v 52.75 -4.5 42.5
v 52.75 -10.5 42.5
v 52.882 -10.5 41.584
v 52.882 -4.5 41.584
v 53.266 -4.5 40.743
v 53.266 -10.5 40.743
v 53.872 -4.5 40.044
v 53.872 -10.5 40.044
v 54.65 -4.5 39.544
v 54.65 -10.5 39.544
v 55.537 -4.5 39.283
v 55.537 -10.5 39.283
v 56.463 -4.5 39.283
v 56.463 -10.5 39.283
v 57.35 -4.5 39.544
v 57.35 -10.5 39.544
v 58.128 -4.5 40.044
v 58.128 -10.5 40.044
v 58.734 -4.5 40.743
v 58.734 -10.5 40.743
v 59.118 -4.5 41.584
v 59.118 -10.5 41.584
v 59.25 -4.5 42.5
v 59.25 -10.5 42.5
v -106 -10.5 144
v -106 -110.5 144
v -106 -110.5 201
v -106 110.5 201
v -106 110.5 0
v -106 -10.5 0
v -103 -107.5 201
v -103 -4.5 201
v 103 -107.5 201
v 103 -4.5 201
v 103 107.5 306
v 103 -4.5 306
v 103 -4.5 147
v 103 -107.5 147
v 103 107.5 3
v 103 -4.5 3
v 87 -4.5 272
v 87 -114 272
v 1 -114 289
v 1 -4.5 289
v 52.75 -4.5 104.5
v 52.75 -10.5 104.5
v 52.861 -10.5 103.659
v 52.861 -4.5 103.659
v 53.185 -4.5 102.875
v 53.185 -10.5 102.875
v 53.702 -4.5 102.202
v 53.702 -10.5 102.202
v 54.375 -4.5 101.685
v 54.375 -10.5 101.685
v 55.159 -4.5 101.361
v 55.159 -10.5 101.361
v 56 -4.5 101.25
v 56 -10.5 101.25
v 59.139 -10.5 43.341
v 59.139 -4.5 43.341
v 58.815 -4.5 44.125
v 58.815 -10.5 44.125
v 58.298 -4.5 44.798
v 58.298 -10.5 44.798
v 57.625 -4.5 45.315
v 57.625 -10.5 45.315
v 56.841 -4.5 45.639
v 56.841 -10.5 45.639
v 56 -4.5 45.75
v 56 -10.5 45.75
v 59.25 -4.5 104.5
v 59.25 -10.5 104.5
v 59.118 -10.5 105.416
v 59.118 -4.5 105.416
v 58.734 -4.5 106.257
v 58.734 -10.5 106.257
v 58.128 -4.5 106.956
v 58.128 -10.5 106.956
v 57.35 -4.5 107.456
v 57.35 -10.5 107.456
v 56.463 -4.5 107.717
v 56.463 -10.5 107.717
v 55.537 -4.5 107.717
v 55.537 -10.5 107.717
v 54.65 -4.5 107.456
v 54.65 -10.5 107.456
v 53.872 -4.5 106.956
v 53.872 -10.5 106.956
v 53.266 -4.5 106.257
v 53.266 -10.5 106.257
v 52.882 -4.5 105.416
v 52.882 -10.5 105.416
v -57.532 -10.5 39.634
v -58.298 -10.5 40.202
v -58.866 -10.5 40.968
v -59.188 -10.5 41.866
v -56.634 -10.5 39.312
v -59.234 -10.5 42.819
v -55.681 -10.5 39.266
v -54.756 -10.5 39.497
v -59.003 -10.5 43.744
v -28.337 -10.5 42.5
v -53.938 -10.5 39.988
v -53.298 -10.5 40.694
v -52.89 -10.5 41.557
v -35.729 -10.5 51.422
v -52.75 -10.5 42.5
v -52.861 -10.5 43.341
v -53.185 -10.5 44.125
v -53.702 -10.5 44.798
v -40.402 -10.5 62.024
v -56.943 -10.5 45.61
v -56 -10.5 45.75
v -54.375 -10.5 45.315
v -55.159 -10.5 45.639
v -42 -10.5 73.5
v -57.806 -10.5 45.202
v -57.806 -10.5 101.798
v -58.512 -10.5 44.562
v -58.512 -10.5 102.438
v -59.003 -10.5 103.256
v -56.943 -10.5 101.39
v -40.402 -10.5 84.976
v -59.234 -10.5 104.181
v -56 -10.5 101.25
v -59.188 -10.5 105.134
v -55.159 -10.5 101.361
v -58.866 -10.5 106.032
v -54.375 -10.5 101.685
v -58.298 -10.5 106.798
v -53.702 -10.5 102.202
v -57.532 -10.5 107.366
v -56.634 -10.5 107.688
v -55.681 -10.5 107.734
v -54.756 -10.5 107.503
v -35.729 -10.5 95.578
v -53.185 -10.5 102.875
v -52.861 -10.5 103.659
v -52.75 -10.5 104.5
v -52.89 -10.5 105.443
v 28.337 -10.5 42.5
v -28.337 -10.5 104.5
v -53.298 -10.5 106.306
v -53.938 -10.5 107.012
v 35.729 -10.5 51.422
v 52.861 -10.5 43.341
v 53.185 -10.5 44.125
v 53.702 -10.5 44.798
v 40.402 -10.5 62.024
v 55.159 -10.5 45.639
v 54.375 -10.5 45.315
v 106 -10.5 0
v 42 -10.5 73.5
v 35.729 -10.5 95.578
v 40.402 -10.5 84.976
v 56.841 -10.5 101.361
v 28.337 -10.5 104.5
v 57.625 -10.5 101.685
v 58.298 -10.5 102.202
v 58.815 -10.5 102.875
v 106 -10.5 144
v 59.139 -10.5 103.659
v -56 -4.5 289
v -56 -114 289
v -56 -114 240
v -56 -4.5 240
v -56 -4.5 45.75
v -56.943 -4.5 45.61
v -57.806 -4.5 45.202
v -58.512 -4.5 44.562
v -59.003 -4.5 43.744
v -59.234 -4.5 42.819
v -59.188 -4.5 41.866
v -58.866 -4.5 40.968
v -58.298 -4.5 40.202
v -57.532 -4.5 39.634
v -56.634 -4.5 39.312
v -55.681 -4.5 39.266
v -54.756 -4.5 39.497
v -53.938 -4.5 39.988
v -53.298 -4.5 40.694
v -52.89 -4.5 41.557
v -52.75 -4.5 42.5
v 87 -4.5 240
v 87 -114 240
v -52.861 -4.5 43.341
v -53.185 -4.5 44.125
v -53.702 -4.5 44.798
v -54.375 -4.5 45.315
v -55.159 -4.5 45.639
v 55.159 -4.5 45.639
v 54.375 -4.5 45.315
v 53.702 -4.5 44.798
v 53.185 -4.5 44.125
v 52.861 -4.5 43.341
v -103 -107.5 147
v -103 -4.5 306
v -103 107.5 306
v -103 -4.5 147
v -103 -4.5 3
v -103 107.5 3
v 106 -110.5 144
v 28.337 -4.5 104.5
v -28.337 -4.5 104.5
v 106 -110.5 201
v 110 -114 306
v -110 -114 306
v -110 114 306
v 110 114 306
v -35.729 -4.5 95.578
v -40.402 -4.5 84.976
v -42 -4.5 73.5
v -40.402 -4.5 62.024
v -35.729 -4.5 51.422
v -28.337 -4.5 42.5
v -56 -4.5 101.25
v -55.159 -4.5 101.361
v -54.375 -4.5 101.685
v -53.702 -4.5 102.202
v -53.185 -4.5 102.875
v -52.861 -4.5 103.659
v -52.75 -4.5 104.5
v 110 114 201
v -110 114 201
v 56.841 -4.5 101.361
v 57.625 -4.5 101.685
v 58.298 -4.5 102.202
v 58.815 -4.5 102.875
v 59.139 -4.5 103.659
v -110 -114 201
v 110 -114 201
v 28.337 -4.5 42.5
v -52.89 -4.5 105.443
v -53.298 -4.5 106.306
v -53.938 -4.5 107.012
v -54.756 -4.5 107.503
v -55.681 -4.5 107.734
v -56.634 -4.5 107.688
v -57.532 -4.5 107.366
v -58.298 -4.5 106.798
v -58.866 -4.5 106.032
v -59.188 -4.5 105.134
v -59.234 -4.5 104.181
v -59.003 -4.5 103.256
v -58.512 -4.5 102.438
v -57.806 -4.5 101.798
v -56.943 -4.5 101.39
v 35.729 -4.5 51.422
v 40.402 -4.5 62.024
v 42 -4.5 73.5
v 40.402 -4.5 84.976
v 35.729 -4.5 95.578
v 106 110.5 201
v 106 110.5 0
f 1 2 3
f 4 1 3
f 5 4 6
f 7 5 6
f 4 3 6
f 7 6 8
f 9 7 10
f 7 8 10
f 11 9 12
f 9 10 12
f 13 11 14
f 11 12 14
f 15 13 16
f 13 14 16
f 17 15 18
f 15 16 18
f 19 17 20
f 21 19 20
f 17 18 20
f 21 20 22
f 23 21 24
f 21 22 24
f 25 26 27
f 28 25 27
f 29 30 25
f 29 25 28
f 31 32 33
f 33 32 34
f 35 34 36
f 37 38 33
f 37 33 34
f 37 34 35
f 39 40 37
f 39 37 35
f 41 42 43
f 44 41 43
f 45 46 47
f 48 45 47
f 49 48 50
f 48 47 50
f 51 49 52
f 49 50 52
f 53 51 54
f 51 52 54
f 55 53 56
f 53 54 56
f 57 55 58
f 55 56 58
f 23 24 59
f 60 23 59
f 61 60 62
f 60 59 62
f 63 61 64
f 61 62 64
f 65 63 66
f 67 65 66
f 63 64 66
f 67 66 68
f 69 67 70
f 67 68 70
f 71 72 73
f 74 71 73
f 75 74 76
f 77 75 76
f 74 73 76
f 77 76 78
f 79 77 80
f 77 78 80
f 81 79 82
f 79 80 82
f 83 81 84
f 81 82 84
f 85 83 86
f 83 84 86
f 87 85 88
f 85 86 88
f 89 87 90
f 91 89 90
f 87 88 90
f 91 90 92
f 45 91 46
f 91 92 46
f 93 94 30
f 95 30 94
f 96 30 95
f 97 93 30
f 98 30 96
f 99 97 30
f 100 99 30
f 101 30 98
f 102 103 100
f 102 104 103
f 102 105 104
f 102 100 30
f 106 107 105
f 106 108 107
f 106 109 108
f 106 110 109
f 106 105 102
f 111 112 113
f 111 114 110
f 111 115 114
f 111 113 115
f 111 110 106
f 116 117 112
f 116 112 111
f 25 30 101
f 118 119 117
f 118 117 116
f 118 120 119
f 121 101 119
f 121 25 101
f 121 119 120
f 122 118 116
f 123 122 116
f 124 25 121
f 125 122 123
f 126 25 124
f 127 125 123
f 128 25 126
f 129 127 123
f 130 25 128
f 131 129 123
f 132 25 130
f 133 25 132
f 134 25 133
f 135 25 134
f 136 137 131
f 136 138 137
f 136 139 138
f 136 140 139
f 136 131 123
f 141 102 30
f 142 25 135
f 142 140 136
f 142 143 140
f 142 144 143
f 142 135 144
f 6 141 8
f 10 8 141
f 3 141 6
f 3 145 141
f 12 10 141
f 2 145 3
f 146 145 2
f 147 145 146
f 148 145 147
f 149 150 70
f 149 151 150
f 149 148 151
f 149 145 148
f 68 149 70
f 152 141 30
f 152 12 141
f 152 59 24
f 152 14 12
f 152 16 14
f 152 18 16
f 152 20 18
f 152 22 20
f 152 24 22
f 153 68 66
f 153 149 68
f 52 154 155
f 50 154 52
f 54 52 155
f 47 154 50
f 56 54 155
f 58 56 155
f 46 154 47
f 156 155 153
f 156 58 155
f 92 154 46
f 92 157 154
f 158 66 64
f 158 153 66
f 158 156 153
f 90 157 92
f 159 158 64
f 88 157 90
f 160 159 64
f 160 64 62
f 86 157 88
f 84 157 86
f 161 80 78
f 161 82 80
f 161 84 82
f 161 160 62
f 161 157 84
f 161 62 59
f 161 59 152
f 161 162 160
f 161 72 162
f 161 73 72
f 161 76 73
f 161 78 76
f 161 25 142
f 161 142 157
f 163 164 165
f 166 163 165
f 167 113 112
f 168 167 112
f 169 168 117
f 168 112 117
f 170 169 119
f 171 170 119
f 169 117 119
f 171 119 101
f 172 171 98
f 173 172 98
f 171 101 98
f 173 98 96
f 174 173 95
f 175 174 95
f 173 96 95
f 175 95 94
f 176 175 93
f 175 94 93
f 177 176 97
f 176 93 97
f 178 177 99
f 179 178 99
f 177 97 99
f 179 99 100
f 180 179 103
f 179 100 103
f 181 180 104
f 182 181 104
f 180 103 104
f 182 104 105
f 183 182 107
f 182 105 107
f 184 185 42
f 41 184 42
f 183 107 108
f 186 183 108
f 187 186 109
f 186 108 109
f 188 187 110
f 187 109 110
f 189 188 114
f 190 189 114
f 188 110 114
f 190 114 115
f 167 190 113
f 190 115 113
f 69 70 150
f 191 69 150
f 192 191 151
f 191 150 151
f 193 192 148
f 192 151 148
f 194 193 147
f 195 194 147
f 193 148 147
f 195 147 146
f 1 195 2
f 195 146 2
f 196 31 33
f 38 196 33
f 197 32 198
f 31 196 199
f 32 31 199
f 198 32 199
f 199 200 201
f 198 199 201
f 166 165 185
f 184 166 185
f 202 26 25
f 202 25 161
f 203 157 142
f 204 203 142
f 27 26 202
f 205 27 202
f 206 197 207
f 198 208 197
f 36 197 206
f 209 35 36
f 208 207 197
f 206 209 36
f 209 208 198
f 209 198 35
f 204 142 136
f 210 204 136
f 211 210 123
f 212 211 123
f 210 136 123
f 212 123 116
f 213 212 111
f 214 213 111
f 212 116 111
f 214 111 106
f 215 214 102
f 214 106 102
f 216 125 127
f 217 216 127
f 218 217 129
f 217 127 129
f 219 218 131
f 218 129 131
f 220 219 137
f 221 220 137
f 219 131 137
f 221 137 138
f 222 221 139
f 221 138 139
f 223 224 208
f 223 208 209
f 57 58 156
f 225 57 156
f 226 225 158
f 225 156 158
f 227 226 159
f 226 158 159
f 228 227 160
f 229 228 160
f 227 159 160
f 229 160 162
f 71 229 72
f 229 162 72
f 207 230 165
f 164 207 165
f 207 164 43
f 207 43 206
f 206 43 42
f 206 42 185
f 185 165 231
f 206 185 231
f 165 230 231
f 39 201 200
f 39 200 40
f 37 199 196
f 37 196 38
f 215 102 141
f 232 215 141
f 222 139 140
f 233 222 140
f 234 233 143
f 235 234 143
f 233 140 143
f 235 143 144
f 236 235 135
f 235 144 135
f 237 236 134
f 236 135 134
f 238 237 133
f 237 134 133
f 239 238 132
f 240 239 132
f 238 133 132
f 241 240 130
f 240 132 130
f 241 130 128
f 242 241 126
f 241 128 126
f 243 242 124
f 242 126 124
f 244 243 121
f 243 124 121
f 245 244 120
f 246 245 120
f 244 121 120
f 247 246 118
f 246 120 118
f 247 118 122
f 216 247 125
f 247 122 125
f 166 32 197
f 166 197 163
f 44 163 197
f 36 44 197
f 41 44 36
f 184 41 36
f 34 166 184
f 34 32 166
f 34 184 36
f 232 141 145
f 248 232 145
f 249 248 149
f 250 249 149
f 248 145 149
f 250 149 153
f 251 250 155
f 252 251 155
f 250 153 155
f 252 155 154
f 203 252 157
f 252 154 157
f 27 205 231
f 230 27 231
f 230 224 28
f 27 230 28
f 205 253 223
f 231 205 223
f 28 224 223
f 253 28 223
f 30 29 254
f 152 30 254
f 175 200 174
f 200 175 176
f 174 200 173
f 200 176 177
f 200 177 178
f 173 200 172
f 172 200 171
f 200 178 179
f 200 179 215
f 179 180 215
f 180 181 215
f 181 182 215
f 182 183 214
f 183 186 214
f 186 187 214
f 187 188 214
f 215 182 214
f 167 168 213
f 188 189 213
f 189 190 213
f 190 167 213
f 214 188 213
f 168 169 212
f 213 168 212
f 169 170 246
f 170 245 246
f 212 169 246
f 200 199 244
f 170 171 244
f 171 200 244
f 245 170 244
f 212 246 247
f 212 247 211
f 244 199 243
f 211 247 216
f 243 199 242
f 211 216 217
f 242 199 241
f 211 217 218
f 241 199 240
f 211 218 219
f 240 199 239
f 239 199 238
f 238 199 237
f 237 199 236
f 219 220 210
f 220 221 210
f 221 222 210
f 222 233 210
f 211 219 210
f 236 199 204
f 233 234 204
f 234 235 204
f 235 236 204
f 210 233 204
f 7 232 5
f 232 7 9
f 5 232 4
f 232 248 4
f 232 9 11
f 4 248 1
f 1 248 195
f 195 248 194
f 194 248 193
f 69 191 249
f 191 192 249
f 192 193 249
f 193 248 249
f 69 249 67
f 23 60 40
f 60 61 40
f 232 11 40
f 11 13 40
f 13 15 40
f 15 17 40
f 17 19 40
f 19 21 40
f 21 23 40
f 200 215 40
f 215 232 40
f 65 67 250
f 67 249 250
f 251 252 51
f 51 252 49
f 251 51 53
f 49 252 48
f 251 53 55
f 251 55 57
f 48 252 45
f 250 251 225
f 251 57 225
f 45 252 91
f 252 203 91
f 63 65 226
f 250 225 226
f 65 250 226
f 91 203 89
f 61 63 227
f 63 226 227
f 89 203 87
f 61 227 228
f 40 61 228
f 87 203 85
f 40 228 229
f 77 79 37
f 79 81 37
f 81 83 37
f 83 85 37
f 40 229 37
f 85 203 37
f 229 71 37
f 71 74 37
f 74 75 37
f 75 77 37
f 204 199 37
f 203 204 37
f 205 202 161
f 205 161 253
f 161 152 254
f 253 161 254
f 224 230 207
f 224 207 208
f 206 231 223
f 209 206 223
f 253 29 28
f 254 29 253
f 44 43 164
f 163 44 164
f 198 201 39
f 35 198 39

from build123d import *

# Parameters (mm, degrees)
F0_W      = 212
F0_H      = 221
F1_DEPTH  = 201
F2_W      = 206
F2_H      = 112
F3_DEPTH  = 198
F4_W      = 212
F4_H      = 144
F5_DEPTH  = 100
F2_H_2    = 3
F6_DEPTH  = 54
F2_H_3    = 100
F7_DEPTH  = 54
F9_DEPTH  = 6
F11_START = 198
F10_W     = 220
F10_H     = 228
F10_W_2   = 206
F10_H_2   = 112
F11_DEPTH = 105
F14_DEPTH = 109.5


with BuildPart() as f1:
    # F0 (on Top) → F1 (new body)
    with BuildSketch(Plane.XY):
        Rectangle(F0_W, F0_H)
    extrude(amount=F1_DEPTH)

    # F2 (on face) → F3 (cut)
    with BuildSketch(Plane.XY.offset(201)):
        with Locations((0, 51.5)):
            Rectangle(F2_W, F2_H)
    extrude(amount=-F3_DEPTH, mode=Mode.SUBTRACT)

    # F4 (on face) → F5 (cut)
    with BuildSketch(Plane.XZ.offset(110.5)):
        with Locations((0, 72)):
            Rectangle(F4_W, F4_H)
    extrude(amount=-F5_DEPTH, mode=Mode.SUBTRACT)

    # F2 (on face) → F6 (cut)
    with BuildSketch(Plane.XY.offset(201)):
        with Locations((0, -6)):
            Rectangle(F2_W, F2_H_2)
    extrude(amount=-F6_DEPTH, mode=Mode.SUBTRACT)

    # F2 (on face) → F7 (cut)
    with BuildSketch(Plane.XY.offset(201)):
        with Locations((0, -57.5)):
            Rectangle(F2_W, F2_H_3)
    extrude(amount=-F7_DEPTH, mode=Mode.SUBTRACT)

    # F8 (on face) → F9 (cut, through all)
    with BuildSketch(Plane.XZ.offset(10.5)):
        with BuildLine():
            Line((-28.3372546306, 42.5), (28.3372546306, 42.5))
            ThreePointArc((28.3372546306, 42.5), (42, 73.5), (28.3372546306, 104.5))
            Line((28.3372546306, 104.5), (-28.3372546306, 104.5))
            ThreePointArc((-28.3372546306, 104.5), (-42, 73.5), (-28.3372546306, 42.5))
        make_face()
        with BuildLine():
            Line((56, 104.5), (56, 101.25))
            ThreePointArc((56, 101.25), (58.2980970389, 102.2019029611), (59.25, 104.5))
            ThreePointArc((59.25, 104.5), (56, 107.75), (52.75, 104.5))
            Line((52.75, 104.5), (56, 104.5))
        make_face()
        with BuildLine():
            ThreePointArc((52.75, 104.5), (53.7019029611, 102.2019029611), (56, 101.25))
            Line((56, 101.25), (56, 104.5))
            Line((56, 104.5), (52.75, 104.5))
        make_face()
        with BuildLine():
            ThreePointArc((56, 45.75), (53.7019029611, 44.7980970389), (52.75, 42.5))
            Line((52.75, 42.5), (56, 42.5))
            Line((56, 42.5), (56, 45.75))
        make_face()
        with BuildLine():
            Line((56, 42.5), (52.75, 42.5))
            ThreePointArc((52.75, 42.5), (56, 39.25), (59.25, 42.5))
            ThreePointArc((59.25, 42.5), (58.2980970389, 44.7980970389), (56, 45.75))
            Line((56, 45.75), (56, 42.5))
        make_face()
        with BuildLine():
            ThreePointArc((-56, 45.75), (-58.2980970389, 40.2019029611), (-52.75, 42.5))
            Line((-52.75, 42.5), (-56, 42.5))
            Line((-56, 42.5), (-56, 45.75))
        make_face()
        with BuildLine():
            Line((-56, 42.5), (-52.75, 42.5))
            ThreePointArc((-52.75, 42.5), (-53.7019029611, 44.7980970389), (-56, 45.75))
            Line((-56, 45.75), (-56, 42.5))
        make_face()
        with BuildLine():
            Line((-56, 104.5), (-56, 101.25))
            ThreePointArc((-56, 101.25), (-53.7019029611, 102.2019029611), (-52.75, 104.5))
            Line((-52.75, 104.5), (-56, 104.5))
        make_face()
        with BuildLine():
            ThreePointArc((-52.75, 104.5), (-58.2980970389, 106.7980970389), (-56, 101.25))
            Line((-56, 101.25), (-56, 104.5))
            Line((-56, 104.5), (-52.75, 104.5))
        make_face()
    extrude(amount=-F9_DEPTH, mode=Mode.SUBTRACT)

    # F10 (on face) → F11 (join)
    with BuildSketch(Plane.XY.offset(3).offset(F11_START)):
        Rectangle(F10_W, F10_H)
        with Locations((0, 51.5)):
            Rectangle(F10_W_2, F10_H_2, mode=Mode.SUBTRACT)
    extrude(amount=F11_DEPTH)

    # F13 (on face) → F14 (cut, through all)
    with BuildSketch(Plane.XZ.offset(114)):
        Polygon((1, 289), (-56, 289), (-56, 240), (87, 240), (87, 272), align=None)
    extrude(amount=-F14_DEPTH, mode=Mode.SUBTRACT)


solid = f1.part
